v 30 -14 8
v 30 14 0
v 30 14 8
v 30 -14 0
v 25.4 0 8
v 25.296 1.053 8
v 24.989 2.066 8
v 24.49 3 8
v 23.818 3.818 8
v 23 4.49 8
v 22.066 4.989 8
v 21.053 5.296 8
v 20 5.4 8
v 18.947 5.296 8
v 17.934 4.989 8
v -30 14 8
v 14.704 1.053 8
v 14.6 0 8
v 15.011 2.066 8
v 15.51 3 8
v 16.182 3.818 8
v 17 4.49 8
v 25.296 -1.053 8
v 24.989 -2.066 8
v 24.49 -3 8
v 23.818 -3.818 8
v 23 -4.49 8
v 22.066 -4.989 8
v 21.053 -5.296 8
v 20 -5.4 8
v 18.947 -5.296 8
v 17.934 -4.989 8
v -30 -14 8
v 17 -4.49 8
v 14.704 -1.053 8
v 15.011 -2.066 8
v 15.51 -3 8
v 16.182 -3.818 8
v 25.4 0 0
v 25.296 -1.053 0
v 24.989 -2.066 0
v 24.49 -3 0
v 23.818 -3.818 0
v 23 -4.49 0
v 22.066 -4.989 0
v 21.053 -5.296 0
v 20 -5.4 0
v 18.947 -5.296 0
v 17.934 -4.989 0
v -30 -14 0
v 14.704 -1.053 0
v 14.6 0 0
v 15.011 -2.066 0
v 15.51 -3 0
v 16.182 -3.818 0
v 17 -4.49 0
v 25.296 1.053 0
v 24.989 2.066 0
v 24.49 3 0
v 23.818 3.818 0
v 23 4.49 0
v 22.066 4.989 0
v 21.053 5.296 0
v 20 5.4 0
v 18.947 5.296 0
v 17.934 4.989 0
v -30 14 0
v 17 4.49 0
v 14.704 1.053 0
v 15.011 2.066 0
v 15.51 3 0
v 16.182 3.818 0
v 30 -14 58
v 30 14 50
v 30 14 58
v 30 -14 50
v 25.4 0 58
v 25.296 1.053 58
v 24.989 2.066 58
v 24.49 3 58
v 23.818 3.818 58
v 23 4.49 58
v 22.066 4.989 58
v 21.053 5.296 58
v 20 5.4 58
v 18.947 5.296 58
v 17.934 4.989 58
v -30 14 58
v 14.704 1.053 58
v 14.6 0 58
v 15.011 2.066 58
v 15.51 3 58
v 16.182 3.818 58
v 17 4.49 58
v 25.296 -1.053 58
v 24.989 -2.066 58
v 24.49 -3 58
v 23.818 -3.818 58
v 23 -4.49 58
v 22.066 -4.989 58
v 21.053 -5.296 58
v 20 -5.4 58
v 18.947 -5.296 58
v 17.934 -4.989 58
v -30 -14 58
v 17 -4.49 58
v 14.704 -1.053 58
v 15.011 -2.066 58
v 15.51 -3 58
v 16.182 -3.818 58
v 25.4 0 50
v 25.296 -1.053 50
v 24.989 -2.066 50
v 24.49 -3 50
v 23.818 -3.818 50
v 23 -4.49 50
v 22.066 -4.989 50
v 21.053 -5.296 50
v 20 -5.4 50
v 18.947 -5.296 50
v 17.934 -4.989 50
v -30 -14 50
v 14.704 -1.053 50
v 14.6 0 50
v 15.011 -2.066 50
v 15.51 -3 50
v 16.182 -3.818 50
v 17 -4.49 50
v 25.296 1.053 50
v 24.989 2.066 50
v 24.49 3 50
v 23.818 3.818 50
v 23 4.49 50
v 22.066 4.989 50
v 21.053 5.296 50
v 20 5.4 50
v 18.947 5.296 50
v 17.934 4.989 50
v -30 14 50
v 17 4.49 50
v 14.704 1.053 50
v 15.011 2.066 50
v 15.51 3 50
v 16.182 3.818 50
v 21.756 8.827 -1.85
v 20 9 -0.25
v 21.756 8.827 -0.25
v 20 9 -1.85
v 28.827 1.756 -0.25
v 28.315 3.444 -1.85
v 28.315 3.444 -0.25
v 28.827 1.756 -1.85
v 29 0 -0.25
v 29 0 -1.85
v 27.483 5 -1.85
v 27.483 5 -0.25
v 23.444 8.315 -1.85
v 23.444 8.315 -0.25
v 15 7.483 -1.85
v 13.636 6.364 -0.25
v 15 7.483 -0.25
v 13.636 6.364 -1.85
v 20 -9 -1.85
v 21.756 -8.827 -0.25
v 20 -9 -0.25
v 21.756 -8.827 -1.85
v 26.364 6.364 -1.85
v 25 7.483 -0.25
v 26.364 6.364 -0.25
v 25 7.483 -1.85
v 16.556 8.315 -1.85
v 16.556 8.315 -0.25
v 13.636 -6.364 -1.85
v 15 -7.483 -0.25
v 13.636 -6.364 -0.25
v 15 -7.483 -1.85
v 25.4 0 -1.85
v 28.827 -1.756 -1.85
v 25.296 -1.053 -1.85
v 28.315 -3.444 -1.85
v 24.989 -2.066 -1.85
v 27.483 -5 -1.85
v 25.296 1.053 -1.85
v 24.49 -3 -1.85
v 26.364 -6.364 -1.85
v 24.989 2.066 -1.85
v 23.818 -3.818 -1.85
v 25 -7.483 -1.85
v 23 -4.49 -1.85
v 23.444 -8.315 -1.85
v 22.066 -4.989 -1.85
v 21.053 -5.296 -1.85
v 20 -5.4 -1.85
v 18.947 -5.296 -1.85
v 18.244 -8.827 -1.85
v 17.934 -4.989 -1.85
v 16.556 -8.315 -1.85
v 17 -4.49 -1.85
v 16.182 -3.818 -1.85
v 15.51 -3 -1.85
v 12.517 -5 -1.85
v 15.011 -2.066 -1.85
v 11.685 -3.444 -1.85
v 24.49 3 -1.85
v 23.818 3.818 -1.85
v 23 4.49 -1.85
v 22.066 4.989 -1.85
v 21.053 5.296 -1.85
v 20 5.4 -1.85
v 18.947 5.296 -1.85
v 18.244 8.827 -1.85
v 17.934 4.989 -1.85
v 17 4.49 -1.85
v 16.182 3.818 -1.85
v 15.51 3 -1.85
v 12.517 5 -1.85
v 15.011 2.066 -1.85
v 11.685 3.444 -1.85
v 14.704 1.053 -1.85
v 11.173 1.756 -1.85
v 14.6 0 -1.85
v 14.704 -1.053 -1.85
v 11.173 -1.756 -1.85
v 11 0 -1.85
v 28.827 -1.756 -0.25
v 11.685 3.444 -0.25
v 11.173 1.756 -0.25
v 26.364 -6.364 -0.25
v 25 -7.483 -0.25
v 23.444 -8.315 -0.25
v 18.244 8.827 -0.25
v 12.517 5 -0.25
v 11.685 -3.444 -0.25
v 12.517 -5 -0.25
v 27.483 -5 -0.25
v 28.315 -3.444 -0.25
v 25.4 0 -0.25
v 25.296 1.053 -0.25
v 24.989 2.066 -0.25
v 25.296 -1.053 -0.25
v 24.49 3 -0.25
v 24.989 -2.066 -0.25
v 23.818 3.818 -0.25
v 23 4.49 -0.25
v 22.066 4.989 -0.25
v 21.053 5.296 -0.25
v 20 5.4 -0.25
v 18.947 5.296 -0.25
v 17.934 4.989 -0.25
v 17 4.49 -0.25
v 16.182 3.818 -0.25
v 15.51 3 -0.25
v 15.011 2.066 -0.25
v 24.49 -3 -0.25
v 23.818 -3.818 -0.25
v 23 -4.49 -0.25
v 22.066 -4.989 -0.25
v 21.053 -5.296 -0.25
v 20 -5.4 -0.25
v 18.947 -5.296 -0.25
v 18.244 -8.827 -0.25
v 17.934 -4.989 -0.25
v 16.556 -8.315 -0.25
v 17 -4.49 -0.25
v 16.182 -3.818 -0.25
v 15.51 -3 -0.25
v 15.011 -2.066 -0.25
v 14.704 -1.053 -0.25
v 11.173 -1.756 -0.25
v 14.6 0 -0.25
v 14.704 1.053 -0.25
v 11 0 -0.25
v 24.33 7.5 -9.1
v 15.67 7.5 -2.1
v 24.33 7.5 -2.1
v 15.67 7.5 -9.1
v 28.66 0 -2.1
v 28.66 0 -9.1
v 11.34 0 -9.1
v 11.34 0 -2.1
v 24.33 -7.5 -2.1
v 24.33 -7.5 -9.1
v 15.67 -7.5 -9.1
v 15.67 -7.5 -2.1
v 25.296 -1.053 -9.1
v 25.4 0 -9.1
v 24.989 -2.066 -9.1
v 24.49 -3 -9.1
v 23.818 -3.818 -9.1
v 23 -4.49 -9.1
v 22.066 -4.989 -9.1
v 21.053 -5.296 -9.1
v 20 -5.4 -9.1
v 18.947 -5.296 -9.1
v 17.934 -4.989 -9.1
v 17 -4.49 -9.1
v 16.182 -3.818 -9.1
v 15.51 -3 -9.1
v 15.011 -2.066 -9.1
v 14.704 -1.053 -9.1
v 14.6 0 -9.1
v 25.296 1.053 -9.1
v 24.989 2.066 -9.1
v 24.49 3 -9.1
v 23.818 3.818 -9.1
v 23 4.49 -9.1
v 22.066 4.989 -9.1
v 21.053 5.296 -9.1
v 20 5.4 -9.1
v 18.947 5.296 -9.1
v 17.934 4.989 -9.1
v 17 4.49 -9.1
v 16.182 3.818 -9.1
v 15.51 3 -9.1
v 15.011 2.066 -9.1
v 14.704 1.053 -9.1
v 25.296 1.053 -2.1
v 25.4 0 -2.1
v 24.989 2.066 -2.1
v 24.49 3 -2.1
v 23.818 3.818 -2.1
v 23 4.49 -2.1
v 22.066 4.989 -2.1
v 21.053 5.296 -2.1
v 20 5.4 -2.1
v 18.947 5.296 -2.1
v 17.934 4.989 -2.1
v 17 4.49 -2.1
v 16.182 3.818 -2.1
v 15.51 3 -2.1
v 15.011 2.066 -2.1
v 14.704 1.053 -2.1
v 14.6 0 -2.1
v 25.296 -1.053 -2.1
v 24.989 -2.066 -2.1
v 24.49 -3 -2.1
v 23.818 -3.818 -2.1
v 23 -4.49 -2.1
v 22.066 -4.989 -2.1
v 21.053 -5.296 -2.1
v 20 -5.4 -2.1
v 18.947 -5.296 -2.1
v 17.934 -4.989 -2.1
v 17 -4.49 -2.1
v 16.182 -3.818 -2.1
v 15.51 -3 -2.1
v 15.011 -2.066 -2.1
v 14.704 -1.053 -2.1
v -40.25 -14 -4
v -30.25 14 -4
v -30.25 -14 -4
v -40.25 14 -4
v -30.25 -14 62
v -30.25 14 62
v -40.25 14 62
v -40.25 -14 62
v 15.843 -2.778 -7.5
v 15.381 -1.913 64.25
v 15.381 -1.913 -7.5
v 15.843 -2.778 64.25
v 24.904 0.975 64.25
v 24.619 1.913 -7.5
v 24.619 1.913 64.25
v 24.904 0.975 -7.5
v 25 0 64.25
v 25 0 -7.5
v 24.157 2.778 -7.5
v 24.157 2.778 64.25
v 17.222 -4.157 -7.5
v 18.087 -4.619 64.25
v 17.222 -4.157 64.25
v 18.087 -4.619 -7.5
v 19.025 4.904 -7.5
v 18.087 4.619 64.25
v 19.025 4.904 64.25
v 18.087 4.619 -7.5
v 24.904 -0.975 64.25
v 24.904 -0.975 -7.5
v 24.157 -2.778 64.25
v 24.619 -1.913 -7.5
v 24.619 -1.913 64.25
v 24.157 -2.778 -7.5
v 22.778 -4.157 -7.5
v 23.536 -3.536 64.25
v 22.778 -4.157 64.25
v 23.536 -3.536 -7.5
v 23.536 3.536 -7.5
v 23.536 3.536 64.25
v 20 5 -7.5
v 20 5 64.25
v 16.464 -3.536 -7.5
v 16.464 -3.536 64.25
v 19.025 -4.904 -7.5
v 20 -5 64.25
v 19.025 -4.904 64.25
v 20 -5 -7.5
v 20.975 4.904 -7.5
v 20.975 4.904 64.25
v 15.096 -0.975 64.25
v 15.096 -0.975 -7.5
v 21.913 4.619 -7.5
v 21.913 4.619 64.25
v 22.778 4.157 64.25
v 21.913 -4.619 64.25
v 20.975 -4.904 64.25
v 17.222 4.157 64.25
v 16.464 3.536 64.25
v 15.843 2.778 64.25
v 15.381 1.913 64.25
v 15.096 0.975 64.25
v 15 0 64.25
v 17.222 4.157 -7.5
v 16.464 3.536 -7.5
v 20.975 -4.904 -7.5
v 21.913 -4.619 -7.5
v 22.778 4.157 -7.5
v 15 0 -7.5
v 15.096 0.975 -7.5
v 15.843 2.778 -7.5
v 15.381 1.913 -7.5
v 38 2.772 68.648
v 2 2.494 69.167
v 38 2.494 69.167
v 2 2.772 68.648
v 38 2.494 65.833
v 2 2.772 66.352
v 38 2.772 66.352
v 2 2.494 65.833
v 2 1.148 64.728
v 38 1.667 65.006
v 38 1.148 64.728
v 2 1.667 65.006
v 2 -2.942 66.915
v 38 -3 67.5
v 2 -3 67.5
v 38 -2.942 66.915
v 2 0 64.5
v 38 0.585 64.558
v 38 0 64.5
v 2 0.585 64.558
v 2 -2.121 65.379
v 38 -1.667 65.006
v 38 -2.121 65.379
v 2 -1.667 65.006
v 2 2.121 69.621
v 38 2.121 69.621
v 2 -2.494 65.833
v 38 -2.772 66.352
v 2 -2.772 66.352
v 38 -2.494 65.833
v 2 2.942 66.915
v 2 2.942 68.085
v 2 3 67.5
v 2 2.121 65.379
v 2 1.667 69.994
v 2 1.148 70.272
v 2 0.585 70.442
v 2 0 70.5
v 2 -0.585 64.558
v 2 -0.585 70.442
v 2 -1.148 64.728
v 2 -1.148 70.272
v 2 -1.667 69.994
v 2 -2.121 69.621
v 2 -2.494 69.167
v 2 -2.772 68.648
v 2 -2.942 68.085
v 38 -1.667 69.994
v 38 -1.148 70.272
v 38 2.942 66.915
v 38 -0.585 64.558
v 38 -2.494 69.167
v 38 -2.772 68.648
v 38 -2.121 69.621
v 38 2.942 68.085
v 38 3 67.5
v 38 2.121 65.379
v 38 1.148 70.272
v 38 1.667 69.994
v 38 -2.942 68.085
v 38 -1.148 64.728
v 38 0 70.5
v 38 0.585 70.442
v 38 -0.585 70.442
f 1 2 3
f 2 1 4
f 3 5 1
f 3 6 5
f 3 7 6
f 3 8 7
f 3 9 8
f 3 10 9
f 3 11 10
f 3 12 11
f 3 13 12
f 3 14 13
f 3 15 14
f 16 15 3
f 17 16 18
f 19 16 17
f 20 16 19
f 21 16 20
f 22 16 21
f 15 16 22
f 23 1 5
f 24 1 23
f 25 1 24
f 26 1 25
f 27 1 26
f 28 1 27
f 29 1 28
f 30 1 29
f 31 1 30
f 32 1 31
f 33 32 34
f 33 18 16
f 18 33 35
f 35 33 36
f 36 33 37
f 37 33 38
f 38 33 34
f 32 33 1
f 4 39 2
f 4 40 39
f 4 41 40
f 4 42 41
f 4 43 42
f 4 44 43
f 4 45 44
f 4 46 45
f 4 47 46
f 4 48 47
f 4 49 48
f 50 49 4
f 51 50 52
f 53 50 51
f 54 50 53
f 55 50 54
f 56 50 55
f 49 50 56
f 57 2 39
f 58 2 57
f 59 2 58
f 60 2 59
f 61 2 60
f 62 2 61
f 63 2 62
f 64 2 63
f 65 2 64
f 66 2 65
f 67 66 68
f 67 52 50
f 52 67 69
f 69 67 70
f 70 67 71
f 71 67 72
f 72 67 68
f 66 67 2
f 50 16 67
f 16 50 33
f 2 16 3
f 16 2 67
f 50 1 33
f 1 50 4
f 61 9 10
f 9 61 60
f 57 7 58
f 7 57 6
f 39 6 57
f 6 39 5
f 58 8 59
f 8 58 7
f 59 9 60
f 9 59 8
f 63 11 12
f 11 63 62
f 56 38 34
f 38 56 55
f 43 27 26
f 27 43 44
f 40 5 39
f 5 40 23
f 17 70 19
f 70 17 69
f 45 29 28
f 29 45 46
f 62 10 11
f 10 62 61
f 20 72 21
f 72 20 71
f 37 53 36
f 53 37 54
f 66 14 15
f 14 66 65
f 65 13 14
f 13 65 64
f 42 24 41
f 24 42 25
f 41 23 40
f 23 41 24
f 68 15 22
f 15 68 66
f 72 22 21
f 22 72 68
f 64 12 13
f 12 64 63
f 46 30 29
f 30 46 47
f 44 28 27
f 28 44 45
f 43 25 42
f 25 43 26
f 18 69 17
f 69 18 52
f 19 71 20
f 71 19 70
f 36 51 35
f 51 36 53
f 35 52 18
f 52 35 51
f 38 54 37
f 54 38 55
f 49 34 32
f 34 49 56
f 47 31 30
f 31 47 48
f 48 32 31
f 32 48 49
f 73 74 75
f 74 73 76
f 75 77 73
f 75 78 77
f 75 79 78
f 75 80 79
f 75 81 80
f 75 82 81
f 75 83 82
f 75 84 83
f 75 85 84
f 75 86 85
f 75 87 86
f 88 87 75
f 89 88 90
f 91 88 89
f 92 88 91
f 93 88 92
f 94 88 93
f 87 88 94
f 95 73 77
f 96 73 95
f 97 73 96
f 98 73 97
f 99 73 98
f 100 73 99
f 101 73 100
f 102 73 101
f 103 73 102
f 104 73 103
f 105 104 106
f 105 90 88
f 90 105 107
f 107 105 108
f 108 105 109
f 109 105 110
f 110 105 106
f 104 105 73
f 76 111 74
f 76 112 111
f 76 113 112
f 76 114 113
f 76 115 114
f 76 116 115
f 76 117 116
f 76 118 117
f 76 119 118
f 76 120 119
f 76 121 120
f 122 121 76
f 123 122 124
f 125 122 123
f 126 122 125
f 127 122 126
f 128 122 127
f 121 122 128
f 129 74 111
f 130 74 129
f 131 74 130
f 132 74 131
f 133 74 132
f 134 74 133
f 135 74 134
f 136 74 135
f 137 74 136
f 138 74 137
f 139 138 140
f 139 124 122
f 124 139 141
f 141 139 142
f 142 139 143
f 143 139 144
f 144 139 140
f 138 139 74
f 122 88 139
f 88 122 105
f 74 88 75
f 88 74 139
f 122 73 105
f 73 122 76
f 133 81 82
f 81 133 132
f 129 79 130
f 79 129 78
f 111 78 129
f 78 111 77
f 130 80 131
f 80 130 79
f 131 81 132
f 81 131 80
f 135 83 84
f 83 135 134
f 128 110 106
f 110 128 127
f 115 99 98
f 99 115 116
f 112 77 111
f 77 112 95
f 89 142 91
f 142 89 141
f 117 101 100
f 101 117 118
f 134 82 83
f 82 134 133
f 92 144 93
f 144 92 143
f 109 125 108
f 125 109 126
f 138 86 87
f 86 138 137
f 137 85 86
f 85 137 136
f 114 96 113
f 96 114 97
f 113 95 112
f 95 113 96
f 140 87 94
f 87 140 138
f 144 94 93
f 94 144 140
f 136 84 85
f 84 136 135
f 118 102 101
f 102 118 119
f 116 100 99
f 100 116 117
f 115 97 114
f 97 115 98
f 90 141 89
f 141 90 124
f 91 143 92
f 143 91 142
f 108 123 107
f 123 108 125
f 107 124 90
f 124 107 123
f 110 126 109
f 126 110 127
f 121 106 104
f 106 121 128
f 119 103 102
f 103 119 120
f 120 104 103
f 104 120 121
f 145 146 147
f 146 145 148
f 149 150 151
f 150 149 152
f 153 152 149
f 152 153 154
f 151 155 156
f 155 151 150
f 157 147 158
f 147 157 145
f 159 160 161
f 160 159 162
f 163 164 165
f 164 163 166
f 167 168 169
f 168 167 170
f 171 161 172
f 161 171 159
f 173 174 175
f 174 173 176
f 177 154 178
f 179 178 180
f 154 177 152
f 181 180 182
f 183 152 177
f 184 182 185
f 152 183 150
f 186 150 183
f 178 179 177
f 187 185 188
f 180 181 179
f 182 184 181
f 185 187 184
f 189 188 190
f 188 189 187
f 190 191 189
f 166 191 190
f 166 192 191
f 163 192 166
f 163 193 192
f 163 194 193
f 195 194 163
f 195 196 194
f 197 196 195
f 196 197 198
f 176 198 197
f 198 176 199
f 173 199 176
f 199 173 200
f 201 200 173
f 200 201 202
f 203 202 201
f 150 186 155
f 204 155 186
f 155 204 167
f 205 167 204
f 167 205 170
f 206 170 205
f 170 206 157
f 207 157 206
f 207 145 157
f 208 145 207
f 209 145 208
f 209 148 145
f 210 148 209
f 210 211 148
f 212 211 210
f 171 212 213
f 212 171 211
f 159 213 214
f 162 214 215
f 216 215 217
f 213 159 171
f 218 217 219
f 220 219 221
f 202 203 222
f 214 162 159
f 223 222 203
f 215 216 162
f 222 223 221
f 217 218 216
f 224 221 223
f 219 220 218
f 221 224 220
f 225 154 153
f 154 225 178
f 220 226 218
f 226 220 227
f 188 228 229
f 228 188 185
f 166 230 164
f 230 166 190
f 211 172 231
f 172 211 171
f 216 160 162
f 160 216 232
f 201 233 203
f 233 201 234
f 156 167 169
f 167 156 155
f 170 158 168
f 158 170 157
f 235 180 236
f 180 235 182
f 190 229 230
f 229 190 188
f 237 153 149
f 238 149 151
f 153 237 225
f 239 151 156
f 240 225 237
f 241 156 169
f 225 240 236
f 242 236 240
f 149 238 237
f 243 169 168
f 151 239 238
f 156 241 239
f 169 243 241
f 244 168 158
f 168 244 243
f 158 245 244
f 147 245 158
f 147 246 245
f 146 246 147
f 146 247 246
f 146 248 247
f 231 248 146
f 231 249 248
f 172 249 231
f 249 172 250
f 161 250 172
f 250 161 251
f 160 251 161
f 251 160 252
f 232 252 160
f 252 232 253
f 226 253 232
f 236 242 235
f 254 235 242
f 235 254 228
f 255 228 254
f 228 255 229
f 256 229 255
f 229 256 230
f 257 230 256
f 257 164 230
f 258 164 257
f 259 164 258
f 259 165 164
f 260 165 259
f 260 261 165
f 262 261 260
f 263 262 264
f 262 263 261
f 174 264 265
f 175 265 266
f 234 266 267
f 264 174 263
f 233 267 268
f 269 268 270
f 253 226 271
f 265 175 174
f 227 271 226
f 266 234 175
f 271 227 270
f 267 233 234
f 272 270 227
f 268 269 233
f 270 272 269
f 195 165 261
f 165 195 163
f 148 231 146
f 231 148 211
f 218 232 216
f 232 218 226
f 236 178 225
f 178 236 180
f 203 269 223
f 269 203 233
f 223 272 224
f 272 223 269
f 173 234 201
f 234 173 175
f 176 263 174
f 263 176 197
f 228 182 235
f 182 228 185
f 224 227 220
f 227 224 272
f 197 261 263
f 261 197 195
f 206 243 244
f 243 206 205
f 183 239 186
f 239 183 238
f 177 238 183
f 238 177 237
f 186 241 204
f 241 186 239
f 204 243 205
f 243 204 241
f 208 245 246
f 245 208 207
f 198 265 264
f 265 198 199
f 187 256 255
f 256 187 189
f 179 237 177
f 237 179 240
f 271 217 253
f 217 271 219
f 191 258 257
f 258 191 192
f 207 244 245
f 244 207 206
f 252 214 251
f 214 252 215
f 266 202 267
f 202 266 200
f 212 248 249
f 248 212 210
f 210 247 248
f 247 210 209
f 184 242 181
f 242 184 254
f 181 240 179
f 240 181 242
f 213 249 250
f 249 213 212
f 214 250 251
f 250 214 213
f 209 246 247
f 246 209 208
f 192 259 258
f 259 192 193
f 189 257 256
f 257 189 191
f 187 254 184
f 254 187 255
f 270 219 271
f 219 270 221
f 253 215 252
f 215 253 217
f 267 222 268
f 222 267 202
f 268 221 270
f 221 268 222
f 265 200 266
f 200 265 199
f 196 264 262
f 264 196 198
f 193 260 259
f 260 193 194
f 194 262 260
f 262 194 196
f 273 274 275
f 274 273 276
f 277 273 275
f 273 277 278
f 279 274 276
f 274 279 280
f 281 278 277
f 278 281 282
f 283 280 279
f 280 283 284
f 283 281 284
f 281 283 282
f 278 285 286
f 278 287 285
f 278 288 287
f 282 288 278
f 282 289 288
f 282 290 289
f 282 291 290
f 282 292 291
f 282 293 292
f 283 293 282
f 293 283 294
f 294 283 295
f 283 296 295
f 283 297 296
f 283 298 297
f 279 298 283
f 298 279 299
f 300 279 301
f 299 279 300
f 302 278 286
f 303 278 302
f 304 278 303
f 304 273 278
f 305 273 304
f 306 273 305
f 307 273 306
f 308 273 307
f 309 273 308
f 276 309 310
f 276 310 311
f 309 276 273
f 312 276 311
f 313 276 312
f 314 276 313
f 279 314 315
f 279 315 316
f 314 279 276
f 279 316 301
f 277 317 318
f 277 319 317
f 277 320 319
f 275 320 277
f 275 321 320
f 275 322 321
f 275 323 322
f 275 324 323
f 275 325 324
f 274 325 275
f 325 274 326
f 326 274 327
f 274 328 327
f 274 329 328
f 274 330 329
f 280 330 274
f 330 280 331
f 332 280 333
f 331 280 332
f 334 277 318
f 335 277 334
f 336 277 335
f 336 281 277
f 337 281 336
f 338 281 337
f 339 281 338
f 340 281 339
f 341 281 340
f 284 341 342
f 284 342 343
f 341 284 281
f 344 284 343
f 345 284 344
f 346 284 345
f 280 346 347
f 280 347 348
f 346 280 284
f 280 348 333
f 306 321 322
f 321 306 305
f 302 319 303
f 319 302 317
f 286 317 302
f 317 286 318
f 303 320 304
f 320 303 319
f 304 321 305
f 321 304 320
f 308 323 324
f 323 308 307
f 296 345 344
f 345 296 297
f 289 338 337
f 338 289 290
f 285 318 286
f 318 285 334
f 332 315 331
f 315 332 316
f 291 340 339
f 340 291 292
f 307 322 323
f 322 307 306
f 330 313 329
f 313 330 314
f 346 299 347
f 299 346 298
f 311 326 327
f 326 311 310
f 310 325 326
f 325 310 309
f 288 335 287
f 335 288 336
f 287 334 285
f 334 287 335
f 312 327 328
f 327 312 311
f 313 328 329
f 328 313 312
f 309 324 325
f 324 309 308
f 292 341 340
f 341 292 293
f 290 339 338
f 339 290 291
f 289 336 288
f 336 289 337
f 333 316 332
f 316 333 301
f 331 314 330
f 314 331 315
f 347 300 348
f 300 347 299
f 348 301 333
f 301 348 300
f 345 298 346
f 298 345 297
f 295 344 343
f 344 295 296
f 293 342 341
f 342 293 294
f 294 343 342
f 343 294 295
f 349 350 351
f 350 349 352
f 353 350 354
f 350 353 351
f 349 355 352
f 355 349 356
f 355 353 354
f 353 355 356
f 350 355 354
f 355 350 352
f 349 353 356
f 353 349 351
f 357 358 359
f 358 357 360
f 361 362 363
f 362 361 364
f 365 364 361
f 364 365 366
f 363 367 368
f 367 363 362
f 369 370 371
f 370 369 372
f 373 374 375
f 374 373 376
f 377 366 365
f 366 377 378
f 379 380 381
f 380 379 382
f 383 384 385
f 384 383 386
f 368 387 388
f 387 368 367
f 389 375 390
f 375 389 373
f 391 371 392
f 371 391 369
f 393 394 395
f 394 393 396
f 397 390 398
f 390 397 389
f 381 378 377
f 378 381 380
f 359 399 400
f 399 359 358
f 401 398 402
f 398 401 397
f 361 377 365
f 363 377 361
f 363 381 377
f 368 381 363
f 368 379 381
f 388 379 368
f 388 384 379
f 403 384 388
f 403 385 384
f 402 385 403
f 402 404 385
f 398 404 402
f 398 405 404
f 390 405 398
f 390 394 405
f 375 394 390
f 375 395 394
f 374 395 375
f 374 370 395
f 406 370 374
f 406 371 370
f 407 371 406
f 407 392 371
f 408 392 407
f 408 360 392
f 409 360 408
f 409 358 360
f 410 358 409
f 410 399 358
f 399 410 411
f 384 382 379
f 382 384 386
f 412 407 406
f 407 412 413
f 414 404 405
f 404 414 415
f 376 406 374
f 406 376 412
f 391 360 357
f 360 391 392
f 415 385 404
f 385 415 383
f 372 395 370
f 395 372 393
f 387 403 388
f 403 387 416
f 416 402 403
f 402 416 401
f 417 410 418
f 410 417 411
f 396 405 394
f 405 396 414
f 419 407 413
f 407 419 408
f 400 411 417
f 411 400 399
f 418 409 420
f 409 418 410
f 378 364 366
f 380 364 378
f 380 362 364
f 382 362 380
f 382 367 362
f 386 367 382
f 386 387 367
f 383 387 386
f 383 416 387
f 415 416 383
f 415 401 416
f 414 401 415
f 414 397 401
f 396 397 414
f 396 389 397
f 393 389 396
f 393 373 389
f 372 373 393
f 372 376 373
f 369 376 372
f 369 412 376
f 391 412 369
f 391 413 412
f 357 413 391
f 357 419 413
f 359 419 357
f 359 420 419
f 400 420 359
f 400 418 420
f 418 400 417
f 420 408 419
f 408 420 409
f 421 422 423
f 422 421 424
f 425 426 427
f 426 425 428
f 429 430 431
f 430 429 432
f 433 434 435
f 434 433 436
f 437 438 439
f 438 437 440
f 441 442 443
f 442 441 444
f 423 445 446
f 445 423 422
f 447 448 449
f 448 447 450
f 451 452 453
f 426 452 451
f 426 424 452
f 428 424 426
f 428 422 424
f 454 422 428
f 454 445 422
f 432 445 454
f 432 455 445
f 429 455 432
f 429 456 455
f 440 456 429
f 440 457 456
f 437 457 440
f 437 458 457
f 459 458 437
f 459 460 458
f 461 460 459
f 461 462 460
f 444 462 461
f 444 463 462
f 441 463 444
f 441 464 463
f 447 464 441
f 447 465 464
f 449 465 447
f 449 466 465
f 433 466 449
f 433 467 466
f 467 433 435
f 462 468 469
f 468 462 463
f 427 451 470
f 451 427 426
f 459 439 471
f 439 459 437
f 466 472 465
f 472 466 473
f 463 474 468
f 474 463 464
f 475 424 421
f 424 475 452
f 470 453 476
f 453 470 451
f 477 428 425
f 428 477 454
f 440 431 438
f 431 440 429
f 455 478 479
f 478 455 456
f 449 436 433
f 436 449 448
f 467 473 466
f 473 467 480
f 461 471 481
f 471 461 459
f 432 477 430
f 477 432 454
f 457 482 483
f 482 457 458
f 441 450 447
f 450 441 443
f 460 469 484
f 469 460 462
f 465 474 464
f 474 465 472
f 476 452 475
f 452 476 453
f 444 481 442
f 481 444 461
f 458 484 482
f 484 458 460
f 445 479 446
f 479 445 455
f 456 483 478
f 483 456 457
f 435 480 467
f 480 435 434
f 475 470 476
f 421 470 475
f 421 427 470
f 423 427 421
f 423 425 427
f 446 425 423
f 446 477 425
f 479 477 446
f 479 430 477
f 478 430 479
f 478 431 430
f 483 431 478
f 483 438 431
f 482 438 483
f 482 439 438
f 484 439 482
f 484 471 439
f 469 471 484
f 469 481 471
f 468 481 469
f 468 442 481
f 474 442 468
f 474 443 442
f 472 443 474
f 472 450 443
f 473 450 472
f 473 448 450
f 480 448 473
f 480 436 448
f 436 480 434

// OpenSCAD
$fn = 32;

// ------------------------------------------------------------------------
// C clamp: throat 50 mm, screw d10
// Every part is its own module, assembly() places every instance.
// ------------------------------------------------------------------------

// --- part 1 ---
module clamp_arm() {
  difference() {
    translate([-30, -14, 0]) cube([60, 28, 8]);
    translate([20, 0, -1]) cylinder(h = 10, d = 10.8);
  }
}

// --- part 2 ---
module clamp_spine() {
  difference() {
    translate([-33, -14, 0]) cube([66, 28, 10]);
  }
}

// --- part 3 ---
module clamp_screw() {
  translate([0, 0, -35.875]) cylinder(h = 71.75, d = 10);
}

// --- part 4 ---
module clamp_washer() {
  difference() {
      translate([0, 0, 0]) cylinder(h = 1.6, d = 18);
      translate([0, 0, -1]) cylinder(h = 3.6, d = 10.8);
    }
}

// --- part 5 ---
module clamp_nut() {
  difference() {
    linear_extrude(height = 7) polygon(points = [[8.66, 0], [4.33, 7.5], [-4.33, 7.5], [-8.66, 0], [-4.33, -7.5], [4.33, -7.5]]);
    translate([0, 0, -1]) cylinder(h = 9, d = 10.8);
  }
}

// --- part 6 ---
module tommy_bar() {
  translate([0, 0, -18]) cylinder(h = 36, d = 6);
}

// --- assembly ---
module assembly() {
  color([0.80, 0.24, 0.20]) translate([0, 0, 0]) rotate([0, 0, 0]) clamp_arm();
  color([0.20, 0.45, 0.75]) translate([0, 0, 50]) rotate([0, 0, 0]) clamp_arm();
  color([0.25, 0.62, 0.32]) translate([-40.25, 0, 29]) rotate([0, 90, 0]) clamp_spine();
  color([0.92, 0.70, 0.18]) translate([20, 0, 28.375]) rotate([0, 0, 0]) clamp_screw();
  color([0.58, 0.35, 0.70]) translate([20, 0, -1.85]) rotate([0, 0, 0]) clamp_washer();
  color([0.16, 0.66, 0.66]) translate([20, 0, -9.1]) rotate([0, 0, 0]) clamp_nut();
  color([0.85, 0.48, 0.18]) translate([20, 0, 67.5]) rotate([0, 90, 0]) tommy_bar();
}

assembly();
